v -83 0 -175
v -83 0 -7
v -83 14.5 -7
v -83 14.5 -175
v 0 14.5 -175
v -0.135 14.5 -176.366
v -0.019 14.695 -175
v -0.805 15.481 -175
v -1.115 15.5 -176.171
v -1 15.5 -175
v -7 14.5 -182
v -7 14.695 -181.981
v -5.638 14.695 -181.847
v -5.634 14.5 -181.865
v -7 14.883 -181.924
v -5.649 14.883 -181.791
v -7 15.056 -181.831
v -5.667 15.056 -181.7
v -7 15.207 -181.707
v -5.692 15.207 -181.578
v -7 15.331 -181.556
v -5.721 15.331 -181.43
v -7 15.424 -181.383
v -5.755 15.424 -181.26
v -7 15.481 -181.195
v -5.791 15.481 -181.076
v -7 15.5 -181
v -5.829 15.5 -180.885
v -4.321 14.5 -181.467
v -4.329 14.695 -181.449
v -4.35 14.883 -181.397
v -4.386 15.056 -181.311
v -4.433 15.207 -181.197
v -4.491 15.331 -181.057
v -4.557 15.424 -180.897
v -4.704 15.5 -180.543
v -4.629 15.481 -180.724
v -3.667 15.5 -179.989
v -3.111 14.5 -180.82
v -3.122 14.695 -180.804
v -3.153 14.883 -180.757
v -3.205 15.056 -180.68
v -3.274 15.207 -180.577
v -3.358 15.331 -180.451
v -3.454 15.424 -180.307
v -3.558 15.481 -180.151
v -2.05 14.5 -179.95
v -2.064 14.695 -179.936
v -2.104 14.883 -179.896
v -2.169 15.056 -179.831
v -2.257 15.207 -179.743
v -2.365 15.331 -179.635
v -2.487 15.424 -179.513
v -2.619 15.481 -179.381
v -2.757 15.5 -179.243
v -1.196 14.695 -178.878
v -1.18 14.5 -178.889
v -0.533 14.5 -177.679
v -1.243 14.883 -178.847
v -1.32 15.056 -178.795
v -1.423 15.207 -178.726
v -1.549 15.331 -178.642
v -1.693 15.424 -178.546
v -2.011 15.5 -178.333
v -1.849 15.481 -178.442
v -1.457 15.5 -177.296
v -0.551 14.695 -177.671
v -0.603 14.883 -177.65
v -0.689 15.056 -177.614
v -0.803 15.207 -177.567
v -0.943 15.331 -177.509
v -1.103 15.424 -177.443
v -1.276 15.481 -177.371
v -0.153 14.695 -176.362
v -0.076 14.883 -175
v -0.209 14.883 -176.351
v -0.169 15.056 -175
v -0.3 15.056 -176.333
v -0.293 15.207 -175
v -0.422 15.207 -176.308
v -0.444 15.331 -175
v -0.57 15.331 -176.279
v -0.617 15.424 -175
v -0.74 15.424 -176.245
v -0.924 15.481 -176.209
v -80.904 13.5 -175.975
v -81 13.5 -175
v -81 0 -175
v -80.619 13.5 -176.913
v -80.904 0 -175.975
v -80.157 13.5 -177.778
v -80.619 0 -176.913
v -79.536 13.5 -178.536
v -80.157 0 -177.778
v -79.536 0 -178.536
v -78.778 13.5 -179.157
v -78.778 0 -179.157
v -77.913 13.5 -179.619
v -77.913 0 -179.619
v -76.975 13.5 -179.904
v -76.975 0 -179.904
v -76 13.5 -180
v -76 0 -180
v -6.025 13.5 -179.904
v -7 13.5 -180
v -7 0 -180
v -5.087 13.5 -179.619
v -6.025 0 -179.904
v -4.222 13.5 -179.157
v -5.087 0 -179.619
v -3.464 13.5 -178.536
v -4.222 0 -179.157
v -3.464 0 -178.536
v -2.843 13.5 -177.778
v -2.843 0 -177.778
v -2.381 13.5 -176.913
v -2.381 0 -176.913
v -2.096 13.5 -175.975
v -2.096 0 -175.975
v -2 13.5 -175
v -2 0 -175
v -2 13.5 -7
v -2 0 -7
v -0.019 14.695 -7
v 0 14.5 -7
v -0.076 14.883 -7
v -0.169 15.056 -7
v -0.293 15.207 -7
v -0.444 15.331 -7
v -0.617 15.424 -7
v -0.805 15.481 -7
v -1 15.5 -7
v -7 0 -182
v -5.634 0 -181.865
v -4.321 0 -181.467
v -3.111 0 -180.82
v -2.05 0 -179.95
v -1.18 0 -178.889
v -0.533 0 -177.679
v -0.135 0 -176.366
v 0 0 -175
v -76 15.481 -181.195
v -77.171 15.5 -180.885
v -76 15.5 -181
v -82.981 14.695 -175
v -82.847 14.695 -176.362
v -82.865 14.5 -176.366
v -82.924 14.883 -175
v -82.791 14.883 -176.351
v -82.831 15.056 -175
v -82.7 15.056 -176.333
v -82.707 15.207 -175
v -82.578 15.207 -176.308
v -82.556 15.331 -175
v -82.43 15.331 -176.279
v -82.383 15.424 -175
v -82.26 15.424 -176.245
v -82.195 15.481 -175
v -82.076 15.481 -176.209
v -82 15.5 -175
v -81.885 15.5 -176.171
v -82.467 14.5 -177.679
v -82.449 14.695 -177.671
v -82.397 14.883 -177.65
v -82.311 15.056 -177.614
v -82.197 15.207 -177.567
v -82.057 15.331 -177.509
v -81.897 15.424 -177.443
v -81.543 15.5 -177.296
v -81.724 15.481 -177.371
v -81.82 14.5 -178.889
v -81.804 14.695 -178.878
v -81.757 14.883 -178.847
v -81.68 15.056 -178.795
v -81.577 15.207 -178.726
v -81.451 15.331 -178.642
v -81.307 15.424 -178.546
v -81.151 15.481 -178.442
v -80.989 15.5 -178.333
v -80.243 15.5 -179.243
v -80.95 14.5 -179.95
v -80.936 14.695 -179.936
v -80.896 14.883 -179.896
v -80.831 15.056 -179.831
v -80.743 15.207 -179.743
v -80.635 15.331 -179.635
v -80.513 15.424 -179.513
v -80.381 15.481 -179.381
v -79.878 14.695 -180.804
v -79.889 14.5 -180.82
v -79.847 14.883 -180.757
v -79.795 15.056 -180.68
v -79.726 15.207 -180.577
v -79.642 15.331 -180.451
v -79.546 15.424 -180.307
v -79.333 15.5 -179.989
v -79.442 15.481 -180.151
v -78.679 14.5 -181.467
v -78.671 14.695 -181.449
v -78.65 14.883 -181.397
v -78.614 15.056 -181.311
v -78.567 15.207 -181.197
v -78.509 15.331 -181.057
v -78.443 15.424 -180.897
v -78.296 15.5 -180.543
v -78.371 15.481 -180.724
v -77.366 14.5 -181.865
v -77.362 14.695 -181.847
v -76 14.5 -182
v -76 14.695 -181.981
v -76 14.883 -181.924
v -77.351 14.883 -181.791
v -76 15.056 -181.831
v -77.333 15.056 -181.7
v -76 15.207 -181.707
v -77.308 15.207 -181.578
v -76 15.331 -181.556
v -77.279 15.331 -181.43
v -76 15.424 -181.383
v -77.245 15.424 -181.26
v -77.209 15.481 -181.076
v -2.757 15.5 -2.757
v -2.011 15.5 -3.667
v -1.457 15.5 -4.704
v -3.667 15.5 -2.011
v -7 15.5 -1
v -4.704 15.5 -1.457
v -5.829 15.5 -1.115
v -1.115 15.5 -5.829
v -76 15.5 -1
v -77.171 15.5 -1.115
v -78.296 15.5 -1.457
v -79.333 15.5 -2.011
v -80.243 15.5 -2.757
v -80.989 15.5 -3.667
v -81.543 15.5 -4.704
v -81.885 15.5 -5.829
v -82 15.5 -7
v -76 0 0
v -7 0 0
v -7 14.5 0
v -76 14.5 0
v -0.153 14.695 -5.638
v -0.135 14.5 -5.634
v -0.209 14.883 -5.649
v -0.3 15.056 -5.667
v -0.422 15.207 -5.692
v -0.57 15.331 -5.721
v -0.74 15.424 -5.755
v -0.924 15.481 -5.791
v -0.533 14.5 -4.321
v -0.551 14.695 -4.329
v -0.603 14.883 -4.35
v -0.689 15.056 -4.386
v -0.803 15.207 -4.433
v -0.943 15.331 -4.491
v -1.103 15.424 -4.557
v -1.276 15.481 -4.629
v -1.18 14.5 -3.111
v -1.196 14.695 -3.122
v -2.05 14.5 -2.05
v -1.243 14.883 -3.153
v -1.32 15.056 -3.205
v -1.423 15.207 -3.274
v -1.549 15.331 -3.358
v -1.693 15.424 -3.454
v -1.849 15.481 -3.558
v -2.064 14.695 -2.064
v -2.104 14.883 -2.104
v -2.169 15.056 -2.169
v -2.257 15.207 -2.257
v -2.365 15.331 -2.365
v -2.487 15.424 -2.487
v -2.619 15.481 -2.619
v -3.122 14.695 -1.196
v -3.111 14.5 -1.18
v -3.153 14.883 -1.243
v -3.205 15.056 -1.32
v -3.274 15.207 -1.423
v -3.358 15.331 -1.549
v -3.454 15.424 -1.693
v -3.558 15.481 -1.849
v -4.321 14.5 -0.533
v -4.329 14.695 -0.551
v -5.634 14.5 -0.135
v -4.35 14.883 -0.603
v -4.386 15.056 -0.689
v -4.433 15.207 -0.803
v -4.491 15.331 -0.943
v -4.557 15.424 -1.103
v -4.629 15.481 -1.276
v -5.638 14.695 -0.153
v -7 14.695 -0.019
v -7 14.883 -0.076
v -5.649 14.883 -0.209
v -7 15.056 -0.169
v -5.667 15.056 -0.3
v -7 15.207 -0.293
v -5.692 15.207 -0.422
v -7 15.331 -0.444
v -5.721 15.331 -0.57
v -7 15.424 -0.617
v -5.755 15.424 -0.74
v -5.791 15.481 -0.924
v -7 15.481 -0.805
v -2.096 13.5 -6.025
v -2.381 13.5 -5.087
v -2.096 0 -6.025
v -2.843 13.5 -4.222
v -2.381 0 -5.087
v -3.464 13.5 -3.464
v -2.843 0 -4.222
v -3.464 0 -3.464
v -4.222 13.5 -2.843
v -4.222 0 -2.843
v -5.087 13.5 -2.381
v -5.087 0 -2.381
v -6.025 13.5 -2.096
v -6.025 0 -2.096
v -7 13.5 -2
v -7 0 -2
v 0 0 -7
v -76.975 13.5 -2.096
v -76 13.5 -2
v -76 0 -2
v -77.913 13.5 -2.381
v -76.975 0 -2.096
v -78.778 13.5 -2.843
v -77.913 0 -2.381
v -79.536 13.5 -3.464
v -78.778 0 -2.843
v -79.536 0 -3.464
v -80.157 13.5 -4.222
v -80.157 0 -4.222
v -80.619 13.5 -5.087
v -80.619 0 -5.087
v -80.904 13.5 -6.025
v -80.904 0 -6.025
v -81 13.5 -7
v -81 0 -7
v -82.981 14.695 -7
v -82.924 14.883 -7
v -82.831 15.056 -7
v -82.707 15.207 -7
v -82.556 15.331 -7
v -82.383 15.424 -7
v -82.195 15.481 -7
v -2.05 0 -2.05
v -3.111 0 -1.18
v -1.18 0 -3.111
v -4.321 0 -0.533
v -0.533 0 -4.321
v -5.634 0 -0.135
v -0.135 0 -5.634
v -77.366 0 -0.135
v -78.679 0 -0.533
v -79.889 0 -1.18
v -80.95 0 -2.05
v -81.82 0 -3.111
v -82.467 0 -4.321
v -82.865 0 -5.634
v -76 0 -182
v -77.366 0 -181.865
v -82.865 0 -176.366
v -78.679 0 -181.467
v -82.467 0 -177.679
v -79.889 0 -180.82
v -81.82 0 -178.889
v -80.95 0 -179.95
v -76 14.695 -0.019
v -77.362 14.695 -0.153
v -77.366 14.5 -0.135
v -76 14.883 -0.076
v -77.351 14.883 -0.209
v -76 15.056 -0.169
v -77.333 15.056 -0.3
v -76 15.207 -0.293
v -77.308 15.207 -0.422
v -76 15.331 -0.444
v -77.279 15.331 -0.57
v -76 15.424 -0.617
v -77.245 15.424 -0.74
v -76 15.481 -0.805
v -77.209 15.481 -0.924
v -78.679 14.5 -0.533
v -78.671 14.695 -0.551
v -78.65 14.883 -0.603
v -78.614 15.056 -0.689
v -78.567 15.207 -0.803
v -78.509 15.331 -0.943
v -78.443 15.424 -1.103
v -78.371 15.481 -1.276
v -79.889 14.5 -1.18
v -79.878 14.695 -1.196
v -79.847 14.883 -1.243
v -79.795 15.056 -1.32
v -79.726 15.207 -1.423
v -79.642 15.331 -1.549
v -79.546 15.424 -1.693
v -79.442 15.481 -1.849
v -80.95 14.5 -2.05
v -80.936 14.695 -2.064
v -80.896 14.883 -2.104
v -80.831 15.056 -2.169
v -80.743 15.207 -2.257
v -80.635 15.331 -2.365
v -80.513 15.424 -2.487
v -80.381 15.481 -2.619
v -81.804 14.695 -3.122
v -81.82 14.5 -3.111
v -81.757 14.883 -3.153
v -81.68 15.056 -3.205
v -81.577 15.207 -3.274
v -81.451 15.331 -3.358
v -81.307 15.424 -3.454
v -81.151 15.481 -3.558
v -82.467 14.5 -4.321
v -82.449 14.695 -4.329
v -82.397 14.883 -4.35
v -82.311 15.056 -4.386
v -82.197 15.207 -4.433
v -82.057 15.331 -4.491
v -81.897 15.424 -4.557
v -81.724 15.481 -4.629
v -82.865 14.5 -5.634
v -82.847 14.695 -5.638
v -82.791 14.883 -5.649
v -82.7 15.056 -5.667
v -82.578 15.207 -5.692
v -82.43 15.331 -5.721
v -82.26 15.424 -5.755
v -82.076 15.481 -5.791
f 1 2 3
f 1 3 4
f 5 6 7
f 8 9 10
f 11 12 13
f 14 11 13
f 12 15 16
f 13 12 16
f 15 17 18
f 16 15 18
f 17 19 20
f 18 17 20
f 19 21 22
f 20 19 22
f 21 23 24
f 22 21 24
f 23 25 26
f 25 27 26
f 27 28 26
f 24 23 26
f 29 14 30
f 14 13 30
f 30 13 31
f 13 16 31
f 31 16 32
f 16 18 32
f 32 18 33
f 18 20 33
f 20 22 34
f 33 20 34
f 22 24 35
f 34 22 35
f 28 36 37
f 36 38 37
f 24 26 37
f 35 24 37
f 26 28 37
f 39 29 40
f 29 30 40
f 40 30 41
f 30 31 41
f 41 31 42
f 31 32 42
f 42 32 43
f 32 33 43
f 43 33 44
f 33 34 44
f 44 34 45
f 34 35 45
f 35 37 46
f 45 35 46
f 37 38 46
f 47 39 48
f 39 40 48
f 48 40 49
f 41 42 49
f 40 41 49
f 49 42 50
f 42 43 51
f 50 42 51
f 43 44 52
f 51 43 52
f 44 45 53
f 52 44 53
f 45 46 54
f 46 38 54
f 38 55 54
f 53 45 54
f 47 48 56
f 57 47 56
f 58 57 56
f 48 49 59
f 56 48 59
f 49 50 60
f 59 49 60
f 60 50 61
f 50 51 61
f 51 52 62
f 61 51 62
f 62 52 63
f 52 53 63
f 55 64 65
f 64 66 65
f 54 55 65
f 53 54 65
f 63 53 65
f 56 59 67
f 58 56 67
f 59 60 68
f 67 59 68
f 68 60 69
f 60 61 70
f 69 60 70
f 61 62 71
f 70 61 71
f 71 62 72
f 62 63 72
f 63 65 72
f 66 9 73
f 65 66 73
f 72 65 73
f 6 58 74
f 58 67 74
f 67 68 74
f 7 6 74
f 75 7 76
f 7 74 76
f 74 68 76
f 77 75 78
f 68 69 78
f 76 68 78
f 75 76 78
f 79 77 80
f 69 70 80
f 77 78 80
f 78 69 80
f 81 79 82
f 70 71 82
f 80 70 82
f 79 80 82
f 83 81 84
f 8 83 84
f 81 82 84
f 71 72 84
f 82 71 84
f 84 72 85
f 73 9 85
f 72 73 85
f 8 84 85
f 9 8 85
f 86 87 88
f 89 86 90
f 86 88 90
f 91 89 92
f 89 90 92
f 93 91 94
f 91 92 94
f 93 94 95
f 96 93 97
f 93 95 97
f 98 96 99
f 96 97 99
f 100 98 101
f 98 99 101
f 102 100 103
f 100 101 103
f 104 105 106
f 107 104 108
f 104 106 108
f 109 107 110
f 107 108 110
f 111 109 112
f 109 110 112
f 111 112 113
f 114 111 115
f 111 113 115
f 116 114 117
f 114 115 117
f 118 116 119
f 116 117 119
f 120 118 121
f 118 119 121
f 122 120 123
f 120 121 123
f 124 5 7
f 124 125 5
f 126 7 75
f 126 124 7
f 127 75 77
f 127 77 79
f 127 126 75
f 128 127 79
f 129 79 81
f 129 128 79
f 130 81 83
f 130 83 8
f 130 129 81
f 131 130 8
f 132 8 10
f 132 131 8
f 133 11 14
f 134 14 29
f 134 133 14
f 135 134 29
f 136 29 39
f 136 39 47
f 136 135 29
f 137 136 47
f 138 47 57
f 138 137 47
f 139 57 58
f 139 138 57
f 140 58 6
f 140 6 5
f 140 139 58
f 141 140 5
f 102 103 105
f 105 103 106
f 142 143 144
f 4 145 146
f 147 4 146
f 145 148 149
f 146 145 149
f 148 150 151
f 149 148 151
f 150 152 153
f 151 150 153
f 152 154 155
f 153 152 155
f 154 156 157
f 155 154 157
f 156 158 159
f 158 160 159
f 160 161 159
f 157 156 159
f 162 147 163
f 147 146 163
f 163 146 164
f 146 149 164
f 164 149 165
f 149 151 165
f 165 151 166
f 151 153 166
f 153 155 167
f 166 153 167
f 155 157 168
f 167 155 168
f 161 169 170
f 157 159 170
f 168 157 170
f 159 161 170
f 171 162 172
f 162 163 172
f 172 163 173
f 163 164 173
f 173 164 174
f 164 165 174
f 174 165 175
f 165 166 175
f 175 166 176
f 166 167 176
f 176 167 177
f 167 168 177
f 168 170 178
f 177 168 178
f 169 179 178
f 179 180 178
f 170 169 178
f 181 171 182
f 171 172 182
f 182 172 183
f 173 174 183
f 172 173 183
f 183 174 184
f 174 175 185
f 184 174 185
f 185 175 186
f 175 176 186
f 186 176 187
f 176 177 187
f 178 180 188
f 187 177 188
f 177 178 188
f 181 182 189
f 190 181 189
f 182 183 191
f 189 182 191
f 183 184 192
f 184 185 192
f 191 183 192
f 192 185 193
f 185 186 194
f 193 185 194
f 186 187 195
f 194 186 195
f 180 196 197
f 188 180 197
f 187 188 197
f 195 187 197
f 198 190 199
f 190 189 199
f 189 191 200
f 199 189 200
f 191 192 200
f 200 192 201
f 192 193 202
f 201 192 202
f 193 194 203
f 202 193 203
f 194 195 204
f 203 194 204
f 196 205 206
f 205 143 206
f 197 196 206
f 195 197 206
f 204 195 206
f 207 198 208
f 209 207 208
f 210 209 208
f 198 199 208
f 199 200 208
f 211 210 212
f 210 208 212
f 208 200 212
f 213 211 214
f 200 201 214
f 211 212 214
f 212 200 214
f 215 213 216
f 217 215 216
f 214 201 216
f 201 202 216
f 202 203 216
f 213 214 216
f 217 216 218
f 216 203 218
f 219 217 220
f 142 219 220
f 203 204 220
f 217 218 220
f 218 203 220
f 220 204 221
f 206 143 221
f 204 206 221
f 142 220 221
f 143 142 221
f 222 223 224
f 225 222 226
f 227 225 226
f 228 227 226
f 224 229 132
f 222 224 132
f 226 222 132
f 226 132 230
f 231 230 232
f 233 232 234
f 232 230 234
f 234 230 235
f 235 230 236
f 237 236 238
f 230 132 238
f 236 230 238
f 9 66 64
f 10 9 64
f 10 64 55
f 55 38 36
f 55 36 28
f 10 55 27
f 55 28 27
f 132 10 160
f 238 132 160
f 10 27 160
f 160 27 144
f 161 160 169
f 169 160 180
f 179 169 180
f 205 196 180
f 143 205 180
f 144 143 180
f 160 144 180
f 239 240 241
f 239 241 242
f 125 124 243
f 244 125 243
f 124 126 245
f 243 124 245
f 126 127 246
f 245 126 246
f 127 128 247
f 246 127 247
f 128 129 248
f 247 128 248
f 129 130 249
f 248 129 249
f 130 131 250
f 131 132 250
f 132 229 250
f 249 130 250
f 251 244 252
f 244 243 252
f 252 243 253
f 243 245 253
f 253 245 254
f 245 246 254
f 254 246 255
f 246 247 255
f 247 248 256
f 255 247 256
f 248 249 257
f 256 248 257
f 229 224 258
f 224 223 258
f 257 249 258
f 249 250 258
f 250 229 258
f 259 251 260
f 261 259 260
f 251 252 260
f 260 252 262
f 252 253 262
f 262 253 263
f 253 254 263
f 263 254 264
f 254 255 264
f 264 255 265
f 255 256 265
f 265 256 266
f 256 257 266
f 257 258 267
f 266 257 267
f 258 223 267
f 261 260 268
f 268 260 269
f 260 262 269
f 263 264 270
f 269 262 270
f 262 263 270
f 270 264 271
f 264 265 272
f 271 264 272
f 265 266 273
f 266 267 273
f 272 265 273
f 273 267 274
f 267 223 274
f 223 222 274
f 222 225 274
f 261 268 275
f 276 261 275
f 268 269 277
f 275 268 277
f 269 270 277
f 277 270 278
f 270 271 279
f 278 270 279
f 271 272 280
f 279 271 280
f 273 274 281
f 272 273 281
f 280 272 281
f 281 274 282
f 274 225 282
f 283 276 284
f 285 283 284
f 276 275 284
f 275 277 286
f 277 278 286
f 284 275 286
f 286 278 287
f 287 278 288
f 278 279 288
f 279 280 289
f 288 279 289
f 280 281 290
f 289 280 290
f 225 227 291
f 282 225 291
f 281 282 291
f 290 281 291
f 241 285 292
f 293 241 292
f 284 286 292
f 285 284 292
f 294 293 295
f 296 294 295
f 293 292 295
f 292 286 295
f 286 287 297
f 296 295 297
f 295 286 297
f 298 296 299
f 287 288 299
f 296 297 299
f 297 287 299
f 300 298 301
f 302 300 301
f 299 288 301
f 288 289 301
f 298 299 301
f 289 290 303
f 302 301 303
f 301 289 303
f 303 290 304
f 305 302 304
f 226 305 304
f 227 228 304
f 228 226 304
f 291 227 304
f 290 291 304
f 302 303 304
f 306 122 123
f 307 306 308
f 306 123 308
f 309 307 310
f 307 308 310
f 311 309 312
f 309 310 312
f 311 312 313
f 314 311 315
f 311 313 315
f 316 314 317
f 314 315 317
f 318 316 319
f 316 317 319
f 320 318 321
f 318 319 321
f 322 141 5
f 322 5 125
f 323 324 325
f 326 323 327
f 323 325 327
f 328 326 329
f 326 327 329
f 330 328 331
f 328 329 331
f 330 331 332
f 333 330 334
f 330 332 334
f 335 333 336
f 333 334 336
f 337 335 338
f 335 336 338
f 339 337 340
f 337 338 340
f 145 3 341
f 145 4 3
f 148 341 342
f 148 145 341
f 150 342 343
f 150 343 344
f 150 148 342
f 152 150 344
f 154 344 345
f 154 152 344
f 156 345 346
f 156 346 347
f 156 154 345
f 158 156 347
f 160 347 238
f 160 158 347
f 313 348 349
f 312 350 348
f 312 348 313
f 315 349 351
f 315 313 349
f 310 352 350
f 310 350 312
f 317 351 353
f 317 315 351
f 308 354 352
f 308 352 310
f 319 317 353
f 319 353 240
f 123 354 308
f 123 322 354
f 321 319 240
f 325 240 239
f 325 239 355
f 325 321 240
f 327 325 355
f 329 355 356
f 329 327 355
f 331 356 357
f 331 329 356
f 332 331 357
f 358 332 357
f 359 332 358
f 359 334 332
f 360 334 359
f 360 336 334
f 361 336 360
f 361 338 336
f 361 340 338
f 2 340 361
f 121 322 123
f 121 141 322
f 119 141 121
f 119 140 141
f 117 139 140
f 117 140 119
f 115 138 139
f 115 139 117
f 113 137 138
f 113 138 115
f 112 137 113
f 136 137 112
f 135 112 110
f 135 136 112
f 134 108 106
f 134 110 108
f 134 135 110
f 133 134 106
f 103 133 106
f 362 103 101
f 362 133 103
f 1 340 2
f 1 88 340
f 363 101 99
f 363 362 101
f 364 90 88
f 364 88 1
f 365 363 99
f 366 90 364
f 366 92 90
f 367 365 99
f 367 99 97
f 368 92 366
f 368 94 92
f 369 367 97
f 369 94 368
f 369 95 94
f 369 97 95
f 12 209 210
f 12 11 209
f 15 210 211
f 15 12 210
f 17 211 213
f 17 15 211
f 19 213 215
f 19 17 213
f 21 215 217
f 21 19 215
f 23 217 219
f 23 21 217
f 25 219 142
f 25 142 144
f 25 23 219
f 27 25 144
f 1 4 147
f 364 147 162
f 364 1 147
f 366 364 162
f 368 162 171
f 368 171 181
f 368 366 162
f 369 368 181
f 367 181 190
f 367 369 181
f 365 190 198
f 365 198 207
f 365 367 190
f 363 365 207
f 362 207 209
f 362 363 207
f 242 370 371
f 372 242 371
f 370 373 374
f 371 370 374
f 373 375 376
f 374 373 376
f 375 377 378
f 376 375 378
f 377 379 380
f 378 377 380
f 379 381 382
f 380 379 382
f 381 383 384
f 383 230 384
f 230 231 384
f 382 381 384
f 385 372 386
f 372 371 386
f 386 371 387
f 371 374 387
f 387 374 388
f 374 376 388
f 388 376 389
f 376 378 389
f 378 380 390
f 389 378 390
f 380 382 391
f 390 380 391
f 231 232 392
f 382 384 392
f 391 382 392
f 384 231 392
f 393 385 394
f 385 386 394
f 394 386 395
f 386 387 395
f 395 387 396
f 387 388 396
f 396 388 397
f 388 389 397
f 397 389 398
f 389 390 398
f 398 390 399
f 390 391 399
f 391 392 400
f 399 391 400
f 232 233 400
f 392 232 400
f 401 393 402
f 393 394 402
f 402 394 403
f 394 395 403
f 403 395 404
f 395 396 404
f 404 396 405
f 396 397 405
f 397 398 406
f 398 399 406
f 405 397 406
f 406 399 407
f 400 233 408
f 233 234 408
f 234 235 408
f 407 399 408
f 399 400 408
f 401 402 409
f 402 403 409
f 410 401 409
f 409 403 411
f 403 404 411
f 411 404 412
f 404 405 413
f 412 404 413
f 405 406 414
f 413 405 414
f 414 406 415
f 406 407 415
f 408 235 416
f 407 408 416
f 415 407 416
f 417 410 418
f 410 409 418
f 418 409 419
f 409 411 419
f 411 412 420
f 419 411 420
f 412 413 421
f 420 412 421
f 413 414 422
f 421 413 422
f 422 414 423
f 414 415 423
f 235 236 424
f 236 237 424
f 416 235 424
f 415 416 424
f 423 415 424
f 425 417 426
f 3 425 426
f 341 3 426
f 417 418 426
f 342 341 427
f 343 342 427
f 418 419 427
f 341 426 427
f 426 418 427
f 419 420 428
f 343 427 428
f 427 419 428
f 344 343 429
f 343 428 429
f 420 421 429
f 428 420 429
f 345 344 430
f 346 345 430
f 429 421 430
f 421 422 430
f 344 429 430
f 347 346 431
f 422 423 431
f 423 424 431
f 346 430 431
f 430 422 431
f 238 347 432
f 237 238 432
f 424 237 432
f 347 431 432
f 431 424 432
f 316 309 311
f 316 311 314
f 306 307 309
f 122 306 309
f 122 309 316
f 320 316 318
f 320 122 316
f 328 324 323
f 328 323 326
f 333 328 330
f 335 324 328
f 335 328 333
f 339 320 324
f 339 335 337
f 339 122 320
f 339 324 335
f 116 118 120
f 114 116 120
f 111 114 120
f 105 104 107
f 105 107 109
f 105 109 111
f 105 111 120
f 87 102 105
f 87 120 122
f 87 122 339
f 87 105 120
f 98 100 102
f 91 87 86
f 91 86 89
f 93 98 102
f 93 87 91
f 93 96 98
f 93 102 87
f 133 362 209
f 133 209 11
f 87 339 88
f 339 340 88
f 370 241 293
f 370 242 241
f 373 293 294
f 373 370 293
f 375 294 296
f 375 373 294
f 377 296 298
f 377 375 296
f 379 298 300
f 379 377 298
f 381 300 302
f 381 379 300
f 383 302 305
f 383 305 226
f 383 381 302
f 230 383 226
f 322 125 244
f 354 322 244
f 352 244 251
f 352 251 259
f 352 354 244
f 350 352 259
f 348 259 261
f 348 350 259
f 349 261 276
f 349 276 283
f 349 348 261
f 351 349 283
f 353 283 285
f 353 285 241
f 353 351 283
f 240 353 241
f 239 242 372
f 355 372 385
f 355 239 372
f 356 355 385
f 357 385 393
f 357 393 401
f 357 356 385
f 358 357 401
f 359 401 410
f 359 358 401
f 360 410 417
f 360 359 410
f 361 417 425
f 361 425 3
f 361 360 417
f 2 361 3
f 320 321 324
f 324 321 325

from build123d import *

# Parameters (mm, degrees)
EXTRUDE_1_DEPTH = 15.5
SHELL_1_T       = -2
FILLET_1_R      = 1


with BuildPart() as part:
    # Эскиз2 → Бобышка-Вытянуть1 (new body)
    with BuildSketch(Plane(origin=(0, 0, 0), x_dir=(1, 0, 0), z_dir=(0, 1, 0))):
        with BuildLine():
            Line((-7, 0), (-76, 0))
            ThreePointArc((-76, 0), (-80.949747468, 2.050252532), (-83, 7))
            Line((-83, 7), (-83, 175))
            ThreePointArc((-83, 175), (-80.949747468, 179.949747468), (-76, 182))
            Line((-76, 182), (-7, 182))
            ThreePointArc((-7, 182), (-2.050252532, 179.949747468), (0, 175))
            Line((0, 175), (0, 7))
            ThreePointArc((0, 7), (-2.050252532, 2.050252532), (-7, 0))
        make_face()
    extrude(amount=EXTRUDE_1_DEPTH)

    # Оболочка1
    shell_1_openings = [part.faces().sort_by_distance(p)[0] for p in [
        (-41.5, 0, -91),
    ]]
    offset(amount=SHELL_1_T, openings=shell_1_openings, kind=Kind.INTERSECTION)

    # Скругление1
    fillet_1_edges = [part.edges().sort_by_distance(p)[0] for p in [
        (-2.050252532, 15.5, -179.949747468),
        (-41.5, 15.5, -182),
        (-80.949747468, 15.5, -179.949747468),
        (-83, 15.5, -91),
        (-80.949747468, 15.5, -2.050252532),
        (-41.5, 15.5, 0),
        (-2.050252532, 15.5, -2.050252532),
        (0, 15.5, -91),
    ]]
    fillet(fillet_1_edges, radius=FILLET_1_R)


solid = part.part
